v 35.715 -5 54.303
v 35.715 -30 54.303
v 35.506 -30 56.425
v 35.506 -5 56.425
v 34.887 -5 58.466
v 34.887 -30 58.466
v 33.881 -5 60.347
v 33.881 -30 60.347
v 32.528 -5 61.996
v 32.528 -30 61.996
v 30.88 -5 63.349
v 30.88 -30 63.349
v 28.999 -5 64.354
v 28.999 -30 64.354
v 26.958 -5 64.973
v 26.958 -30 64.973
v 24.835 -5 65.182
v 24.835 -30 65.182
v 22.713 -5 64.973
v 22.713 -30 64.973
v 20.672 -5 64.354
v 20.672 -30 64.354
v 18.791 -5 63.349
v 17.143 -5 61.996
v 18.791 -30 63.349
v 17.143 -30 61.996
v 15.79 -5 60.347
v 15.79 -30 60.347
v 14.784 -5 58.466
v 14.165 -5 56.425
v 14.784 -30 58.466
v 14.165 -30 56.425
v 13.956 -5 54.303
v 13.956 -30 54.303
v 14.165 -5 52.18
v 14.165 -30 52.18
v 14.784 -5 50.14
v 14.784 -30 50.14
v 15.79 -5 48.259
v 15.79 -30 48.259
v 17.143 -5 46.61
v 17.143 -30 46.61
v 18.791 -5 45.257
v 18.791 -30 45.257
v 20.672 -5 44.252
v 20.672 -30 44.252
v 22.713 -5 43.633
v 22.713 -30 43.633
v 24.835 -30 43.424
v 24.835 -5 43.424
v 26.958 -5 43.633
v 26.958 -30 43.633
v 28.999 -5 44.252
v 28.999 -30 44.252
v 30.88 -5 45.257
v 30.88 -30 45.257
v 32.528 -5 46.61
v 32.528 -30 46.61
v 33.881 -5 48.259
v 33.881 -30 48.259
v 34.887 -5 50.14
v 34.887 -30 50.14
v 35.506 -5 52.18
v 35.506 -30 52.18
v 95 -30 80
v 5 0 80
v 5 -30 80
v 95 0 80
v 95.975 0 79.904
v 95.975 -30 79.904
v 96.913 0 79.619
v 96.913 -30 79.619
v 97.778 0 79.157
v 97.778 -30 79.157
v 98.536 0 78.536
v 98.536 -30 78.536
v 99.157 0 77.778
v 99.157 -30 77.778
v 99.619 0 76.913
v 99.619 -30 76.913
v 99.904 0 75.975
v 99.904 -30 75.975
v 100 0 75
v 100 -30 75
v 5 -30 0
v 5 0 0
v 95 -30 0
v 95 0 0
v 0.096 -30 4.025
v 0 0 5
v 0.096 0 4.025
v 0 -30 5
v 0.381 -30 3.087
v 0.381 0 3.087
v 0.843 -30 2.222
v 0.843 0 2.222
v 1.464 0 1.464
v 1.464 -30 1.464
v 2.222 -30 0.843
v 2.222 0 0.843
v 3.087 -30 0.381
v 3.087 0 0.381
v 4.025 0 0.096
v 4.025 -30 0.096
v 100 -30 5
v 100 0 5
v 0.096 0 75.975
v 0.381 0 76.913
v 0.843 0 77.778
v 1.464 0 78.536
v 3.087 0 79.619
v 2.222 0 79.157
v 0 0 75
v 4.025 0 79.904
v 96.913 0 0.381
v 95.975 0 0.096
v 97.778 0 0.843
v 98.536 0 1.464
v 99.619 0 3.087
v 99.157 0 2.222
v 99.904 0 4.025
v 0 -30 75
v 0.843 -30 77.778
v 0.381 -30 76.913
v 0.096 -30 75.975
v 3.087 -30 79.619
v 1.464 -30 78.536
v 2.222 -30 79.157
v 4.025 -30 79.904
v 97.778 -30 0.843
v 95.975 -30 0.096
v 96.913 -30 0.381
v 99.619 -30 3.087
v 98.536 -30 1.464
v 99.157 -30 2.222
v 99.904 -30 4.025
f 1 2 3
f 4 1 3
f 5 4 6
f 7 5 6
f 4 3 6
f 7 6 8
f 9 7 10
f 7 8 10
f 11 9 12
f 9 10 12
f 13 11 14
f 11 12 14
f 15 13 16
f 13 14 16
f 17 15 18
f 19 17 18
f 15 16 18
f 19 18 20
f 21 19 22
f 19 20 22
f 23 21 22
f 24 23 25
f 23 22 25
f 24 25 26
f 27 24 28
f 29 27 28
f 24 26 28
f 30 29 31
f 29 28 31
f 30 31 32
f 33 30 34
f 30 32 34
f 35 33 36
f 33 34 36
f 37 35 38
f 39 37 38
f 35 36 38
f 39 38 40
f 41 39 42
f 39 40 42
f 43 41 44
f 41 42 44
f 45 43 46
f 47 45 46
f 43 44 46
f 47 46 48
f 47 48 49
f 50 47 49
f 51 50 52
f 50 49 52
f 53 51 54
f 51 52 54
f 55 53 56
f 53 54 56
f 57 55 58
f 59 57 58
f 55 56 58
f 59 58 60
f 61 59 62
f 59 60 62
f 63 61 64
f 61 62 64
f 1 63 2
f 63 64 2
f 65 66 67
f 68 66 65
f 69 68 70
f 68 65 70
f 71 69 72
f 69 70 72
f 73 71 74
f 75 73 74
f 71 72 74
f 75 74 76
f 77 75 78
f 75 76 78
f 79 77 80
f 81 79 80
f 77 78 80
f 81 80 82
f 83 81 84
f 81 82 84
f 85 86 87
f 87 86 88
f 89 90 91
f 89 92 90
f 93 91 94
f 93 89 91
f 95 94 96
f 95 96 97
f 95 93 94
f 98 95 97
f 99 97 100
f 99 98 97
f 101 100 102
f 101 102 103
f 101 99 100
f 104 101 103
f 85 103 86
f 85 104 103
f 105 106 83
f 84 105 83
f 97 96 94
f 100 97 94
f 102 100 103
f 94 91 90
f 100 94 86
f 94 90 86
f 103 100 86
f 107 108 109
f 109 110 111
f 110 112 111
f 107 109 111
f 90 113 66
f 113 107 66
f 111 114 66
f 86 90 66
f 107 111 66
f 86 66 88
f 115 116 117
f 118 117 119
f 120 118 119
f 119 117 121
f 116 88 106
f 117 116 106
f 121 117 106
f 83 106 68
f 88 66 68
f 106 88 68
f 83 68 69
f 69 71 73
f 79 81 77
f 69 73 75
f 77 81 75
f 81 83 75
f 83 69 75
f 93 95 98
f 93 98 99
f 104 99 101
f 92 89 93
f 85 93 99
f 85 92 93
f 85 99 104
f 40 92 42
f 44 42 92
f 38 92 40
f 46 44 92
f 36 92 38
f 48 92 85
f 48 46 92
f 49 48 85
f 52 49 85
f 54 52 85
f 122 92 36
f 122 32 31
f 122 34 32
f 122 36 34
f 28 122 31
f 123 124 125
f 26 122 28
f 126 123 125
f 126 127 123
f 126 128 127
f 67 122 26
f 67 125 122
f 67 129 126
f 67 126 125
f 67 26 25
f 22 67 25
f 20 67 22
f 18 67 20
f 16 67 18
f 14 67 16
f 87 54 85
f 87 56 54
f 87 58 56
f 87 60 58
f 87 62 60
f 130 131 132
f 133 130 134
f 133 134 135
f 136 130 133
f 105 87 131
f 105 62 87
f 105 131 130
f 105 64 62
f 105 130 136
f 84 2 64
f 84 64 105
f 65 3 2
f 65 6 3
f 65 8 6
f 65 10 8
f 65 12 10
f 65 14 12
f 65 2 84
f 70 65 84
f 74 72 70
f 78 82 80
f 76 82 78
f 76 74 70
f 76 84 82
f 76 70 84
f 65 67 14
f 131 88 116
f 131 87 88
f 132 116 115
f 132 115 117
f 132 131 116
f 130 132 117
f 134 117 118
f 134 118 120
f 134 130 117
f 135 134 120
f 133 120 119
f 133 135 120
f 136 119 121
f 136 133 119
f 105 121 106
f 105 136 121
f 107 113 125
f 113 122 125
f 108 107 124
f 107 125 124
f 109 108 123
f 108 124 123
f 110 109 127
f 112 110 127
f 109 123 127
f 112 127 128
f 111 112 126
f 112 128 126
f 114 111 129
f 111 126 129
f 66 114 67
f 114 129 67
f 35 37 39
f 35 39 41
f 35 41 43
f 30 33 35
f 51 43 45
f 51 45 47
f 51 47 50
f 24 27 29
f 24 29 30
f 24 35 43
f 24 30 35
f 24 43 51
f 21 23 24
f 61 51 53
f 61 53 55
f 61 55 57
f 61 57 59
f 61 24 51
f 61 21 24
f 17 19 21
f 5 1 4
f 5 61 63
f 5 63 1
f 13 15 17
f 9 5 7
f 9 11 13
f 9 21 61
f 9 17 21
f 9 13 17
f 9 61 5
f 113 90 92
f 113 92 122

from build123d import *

# Parameters (mm, degrees)
F0_W     = 100
F0_H     = 80
F1_DEPTH = 30
F2_R     = 10.879287
F3_DEPTH = 25
F4_R     = 5


with BuildPart() as f1:
    # F0 (on Front) → F1 (new body)
    with BuildSketch(Plane.XZ):
        with Locations((50, 40)):
            Rectangle(F0_W, F0_H)
    extrude(amount=F1_DEPTH)

    # F2 (on face) → F3 (cut)
    with BuildSketch(Plane.XZ.offset(30)):
        with Locations((24.835449, 54.302912)):
            Circle(F2_R)
    extrude(amount=-F3_DEPTH, mode=Mode.SUBTRACT)

    # F4
    f4_edges = [f1.edges().sort_by_distance(p)[0] for p in [
        (0, -15, 80),
        (100, -15, 80),
        (100, -15, 0),
        (0, -15, 0),
    ]]
    fillet(f4_edges, radius=F4_R)


solid = f1.part
